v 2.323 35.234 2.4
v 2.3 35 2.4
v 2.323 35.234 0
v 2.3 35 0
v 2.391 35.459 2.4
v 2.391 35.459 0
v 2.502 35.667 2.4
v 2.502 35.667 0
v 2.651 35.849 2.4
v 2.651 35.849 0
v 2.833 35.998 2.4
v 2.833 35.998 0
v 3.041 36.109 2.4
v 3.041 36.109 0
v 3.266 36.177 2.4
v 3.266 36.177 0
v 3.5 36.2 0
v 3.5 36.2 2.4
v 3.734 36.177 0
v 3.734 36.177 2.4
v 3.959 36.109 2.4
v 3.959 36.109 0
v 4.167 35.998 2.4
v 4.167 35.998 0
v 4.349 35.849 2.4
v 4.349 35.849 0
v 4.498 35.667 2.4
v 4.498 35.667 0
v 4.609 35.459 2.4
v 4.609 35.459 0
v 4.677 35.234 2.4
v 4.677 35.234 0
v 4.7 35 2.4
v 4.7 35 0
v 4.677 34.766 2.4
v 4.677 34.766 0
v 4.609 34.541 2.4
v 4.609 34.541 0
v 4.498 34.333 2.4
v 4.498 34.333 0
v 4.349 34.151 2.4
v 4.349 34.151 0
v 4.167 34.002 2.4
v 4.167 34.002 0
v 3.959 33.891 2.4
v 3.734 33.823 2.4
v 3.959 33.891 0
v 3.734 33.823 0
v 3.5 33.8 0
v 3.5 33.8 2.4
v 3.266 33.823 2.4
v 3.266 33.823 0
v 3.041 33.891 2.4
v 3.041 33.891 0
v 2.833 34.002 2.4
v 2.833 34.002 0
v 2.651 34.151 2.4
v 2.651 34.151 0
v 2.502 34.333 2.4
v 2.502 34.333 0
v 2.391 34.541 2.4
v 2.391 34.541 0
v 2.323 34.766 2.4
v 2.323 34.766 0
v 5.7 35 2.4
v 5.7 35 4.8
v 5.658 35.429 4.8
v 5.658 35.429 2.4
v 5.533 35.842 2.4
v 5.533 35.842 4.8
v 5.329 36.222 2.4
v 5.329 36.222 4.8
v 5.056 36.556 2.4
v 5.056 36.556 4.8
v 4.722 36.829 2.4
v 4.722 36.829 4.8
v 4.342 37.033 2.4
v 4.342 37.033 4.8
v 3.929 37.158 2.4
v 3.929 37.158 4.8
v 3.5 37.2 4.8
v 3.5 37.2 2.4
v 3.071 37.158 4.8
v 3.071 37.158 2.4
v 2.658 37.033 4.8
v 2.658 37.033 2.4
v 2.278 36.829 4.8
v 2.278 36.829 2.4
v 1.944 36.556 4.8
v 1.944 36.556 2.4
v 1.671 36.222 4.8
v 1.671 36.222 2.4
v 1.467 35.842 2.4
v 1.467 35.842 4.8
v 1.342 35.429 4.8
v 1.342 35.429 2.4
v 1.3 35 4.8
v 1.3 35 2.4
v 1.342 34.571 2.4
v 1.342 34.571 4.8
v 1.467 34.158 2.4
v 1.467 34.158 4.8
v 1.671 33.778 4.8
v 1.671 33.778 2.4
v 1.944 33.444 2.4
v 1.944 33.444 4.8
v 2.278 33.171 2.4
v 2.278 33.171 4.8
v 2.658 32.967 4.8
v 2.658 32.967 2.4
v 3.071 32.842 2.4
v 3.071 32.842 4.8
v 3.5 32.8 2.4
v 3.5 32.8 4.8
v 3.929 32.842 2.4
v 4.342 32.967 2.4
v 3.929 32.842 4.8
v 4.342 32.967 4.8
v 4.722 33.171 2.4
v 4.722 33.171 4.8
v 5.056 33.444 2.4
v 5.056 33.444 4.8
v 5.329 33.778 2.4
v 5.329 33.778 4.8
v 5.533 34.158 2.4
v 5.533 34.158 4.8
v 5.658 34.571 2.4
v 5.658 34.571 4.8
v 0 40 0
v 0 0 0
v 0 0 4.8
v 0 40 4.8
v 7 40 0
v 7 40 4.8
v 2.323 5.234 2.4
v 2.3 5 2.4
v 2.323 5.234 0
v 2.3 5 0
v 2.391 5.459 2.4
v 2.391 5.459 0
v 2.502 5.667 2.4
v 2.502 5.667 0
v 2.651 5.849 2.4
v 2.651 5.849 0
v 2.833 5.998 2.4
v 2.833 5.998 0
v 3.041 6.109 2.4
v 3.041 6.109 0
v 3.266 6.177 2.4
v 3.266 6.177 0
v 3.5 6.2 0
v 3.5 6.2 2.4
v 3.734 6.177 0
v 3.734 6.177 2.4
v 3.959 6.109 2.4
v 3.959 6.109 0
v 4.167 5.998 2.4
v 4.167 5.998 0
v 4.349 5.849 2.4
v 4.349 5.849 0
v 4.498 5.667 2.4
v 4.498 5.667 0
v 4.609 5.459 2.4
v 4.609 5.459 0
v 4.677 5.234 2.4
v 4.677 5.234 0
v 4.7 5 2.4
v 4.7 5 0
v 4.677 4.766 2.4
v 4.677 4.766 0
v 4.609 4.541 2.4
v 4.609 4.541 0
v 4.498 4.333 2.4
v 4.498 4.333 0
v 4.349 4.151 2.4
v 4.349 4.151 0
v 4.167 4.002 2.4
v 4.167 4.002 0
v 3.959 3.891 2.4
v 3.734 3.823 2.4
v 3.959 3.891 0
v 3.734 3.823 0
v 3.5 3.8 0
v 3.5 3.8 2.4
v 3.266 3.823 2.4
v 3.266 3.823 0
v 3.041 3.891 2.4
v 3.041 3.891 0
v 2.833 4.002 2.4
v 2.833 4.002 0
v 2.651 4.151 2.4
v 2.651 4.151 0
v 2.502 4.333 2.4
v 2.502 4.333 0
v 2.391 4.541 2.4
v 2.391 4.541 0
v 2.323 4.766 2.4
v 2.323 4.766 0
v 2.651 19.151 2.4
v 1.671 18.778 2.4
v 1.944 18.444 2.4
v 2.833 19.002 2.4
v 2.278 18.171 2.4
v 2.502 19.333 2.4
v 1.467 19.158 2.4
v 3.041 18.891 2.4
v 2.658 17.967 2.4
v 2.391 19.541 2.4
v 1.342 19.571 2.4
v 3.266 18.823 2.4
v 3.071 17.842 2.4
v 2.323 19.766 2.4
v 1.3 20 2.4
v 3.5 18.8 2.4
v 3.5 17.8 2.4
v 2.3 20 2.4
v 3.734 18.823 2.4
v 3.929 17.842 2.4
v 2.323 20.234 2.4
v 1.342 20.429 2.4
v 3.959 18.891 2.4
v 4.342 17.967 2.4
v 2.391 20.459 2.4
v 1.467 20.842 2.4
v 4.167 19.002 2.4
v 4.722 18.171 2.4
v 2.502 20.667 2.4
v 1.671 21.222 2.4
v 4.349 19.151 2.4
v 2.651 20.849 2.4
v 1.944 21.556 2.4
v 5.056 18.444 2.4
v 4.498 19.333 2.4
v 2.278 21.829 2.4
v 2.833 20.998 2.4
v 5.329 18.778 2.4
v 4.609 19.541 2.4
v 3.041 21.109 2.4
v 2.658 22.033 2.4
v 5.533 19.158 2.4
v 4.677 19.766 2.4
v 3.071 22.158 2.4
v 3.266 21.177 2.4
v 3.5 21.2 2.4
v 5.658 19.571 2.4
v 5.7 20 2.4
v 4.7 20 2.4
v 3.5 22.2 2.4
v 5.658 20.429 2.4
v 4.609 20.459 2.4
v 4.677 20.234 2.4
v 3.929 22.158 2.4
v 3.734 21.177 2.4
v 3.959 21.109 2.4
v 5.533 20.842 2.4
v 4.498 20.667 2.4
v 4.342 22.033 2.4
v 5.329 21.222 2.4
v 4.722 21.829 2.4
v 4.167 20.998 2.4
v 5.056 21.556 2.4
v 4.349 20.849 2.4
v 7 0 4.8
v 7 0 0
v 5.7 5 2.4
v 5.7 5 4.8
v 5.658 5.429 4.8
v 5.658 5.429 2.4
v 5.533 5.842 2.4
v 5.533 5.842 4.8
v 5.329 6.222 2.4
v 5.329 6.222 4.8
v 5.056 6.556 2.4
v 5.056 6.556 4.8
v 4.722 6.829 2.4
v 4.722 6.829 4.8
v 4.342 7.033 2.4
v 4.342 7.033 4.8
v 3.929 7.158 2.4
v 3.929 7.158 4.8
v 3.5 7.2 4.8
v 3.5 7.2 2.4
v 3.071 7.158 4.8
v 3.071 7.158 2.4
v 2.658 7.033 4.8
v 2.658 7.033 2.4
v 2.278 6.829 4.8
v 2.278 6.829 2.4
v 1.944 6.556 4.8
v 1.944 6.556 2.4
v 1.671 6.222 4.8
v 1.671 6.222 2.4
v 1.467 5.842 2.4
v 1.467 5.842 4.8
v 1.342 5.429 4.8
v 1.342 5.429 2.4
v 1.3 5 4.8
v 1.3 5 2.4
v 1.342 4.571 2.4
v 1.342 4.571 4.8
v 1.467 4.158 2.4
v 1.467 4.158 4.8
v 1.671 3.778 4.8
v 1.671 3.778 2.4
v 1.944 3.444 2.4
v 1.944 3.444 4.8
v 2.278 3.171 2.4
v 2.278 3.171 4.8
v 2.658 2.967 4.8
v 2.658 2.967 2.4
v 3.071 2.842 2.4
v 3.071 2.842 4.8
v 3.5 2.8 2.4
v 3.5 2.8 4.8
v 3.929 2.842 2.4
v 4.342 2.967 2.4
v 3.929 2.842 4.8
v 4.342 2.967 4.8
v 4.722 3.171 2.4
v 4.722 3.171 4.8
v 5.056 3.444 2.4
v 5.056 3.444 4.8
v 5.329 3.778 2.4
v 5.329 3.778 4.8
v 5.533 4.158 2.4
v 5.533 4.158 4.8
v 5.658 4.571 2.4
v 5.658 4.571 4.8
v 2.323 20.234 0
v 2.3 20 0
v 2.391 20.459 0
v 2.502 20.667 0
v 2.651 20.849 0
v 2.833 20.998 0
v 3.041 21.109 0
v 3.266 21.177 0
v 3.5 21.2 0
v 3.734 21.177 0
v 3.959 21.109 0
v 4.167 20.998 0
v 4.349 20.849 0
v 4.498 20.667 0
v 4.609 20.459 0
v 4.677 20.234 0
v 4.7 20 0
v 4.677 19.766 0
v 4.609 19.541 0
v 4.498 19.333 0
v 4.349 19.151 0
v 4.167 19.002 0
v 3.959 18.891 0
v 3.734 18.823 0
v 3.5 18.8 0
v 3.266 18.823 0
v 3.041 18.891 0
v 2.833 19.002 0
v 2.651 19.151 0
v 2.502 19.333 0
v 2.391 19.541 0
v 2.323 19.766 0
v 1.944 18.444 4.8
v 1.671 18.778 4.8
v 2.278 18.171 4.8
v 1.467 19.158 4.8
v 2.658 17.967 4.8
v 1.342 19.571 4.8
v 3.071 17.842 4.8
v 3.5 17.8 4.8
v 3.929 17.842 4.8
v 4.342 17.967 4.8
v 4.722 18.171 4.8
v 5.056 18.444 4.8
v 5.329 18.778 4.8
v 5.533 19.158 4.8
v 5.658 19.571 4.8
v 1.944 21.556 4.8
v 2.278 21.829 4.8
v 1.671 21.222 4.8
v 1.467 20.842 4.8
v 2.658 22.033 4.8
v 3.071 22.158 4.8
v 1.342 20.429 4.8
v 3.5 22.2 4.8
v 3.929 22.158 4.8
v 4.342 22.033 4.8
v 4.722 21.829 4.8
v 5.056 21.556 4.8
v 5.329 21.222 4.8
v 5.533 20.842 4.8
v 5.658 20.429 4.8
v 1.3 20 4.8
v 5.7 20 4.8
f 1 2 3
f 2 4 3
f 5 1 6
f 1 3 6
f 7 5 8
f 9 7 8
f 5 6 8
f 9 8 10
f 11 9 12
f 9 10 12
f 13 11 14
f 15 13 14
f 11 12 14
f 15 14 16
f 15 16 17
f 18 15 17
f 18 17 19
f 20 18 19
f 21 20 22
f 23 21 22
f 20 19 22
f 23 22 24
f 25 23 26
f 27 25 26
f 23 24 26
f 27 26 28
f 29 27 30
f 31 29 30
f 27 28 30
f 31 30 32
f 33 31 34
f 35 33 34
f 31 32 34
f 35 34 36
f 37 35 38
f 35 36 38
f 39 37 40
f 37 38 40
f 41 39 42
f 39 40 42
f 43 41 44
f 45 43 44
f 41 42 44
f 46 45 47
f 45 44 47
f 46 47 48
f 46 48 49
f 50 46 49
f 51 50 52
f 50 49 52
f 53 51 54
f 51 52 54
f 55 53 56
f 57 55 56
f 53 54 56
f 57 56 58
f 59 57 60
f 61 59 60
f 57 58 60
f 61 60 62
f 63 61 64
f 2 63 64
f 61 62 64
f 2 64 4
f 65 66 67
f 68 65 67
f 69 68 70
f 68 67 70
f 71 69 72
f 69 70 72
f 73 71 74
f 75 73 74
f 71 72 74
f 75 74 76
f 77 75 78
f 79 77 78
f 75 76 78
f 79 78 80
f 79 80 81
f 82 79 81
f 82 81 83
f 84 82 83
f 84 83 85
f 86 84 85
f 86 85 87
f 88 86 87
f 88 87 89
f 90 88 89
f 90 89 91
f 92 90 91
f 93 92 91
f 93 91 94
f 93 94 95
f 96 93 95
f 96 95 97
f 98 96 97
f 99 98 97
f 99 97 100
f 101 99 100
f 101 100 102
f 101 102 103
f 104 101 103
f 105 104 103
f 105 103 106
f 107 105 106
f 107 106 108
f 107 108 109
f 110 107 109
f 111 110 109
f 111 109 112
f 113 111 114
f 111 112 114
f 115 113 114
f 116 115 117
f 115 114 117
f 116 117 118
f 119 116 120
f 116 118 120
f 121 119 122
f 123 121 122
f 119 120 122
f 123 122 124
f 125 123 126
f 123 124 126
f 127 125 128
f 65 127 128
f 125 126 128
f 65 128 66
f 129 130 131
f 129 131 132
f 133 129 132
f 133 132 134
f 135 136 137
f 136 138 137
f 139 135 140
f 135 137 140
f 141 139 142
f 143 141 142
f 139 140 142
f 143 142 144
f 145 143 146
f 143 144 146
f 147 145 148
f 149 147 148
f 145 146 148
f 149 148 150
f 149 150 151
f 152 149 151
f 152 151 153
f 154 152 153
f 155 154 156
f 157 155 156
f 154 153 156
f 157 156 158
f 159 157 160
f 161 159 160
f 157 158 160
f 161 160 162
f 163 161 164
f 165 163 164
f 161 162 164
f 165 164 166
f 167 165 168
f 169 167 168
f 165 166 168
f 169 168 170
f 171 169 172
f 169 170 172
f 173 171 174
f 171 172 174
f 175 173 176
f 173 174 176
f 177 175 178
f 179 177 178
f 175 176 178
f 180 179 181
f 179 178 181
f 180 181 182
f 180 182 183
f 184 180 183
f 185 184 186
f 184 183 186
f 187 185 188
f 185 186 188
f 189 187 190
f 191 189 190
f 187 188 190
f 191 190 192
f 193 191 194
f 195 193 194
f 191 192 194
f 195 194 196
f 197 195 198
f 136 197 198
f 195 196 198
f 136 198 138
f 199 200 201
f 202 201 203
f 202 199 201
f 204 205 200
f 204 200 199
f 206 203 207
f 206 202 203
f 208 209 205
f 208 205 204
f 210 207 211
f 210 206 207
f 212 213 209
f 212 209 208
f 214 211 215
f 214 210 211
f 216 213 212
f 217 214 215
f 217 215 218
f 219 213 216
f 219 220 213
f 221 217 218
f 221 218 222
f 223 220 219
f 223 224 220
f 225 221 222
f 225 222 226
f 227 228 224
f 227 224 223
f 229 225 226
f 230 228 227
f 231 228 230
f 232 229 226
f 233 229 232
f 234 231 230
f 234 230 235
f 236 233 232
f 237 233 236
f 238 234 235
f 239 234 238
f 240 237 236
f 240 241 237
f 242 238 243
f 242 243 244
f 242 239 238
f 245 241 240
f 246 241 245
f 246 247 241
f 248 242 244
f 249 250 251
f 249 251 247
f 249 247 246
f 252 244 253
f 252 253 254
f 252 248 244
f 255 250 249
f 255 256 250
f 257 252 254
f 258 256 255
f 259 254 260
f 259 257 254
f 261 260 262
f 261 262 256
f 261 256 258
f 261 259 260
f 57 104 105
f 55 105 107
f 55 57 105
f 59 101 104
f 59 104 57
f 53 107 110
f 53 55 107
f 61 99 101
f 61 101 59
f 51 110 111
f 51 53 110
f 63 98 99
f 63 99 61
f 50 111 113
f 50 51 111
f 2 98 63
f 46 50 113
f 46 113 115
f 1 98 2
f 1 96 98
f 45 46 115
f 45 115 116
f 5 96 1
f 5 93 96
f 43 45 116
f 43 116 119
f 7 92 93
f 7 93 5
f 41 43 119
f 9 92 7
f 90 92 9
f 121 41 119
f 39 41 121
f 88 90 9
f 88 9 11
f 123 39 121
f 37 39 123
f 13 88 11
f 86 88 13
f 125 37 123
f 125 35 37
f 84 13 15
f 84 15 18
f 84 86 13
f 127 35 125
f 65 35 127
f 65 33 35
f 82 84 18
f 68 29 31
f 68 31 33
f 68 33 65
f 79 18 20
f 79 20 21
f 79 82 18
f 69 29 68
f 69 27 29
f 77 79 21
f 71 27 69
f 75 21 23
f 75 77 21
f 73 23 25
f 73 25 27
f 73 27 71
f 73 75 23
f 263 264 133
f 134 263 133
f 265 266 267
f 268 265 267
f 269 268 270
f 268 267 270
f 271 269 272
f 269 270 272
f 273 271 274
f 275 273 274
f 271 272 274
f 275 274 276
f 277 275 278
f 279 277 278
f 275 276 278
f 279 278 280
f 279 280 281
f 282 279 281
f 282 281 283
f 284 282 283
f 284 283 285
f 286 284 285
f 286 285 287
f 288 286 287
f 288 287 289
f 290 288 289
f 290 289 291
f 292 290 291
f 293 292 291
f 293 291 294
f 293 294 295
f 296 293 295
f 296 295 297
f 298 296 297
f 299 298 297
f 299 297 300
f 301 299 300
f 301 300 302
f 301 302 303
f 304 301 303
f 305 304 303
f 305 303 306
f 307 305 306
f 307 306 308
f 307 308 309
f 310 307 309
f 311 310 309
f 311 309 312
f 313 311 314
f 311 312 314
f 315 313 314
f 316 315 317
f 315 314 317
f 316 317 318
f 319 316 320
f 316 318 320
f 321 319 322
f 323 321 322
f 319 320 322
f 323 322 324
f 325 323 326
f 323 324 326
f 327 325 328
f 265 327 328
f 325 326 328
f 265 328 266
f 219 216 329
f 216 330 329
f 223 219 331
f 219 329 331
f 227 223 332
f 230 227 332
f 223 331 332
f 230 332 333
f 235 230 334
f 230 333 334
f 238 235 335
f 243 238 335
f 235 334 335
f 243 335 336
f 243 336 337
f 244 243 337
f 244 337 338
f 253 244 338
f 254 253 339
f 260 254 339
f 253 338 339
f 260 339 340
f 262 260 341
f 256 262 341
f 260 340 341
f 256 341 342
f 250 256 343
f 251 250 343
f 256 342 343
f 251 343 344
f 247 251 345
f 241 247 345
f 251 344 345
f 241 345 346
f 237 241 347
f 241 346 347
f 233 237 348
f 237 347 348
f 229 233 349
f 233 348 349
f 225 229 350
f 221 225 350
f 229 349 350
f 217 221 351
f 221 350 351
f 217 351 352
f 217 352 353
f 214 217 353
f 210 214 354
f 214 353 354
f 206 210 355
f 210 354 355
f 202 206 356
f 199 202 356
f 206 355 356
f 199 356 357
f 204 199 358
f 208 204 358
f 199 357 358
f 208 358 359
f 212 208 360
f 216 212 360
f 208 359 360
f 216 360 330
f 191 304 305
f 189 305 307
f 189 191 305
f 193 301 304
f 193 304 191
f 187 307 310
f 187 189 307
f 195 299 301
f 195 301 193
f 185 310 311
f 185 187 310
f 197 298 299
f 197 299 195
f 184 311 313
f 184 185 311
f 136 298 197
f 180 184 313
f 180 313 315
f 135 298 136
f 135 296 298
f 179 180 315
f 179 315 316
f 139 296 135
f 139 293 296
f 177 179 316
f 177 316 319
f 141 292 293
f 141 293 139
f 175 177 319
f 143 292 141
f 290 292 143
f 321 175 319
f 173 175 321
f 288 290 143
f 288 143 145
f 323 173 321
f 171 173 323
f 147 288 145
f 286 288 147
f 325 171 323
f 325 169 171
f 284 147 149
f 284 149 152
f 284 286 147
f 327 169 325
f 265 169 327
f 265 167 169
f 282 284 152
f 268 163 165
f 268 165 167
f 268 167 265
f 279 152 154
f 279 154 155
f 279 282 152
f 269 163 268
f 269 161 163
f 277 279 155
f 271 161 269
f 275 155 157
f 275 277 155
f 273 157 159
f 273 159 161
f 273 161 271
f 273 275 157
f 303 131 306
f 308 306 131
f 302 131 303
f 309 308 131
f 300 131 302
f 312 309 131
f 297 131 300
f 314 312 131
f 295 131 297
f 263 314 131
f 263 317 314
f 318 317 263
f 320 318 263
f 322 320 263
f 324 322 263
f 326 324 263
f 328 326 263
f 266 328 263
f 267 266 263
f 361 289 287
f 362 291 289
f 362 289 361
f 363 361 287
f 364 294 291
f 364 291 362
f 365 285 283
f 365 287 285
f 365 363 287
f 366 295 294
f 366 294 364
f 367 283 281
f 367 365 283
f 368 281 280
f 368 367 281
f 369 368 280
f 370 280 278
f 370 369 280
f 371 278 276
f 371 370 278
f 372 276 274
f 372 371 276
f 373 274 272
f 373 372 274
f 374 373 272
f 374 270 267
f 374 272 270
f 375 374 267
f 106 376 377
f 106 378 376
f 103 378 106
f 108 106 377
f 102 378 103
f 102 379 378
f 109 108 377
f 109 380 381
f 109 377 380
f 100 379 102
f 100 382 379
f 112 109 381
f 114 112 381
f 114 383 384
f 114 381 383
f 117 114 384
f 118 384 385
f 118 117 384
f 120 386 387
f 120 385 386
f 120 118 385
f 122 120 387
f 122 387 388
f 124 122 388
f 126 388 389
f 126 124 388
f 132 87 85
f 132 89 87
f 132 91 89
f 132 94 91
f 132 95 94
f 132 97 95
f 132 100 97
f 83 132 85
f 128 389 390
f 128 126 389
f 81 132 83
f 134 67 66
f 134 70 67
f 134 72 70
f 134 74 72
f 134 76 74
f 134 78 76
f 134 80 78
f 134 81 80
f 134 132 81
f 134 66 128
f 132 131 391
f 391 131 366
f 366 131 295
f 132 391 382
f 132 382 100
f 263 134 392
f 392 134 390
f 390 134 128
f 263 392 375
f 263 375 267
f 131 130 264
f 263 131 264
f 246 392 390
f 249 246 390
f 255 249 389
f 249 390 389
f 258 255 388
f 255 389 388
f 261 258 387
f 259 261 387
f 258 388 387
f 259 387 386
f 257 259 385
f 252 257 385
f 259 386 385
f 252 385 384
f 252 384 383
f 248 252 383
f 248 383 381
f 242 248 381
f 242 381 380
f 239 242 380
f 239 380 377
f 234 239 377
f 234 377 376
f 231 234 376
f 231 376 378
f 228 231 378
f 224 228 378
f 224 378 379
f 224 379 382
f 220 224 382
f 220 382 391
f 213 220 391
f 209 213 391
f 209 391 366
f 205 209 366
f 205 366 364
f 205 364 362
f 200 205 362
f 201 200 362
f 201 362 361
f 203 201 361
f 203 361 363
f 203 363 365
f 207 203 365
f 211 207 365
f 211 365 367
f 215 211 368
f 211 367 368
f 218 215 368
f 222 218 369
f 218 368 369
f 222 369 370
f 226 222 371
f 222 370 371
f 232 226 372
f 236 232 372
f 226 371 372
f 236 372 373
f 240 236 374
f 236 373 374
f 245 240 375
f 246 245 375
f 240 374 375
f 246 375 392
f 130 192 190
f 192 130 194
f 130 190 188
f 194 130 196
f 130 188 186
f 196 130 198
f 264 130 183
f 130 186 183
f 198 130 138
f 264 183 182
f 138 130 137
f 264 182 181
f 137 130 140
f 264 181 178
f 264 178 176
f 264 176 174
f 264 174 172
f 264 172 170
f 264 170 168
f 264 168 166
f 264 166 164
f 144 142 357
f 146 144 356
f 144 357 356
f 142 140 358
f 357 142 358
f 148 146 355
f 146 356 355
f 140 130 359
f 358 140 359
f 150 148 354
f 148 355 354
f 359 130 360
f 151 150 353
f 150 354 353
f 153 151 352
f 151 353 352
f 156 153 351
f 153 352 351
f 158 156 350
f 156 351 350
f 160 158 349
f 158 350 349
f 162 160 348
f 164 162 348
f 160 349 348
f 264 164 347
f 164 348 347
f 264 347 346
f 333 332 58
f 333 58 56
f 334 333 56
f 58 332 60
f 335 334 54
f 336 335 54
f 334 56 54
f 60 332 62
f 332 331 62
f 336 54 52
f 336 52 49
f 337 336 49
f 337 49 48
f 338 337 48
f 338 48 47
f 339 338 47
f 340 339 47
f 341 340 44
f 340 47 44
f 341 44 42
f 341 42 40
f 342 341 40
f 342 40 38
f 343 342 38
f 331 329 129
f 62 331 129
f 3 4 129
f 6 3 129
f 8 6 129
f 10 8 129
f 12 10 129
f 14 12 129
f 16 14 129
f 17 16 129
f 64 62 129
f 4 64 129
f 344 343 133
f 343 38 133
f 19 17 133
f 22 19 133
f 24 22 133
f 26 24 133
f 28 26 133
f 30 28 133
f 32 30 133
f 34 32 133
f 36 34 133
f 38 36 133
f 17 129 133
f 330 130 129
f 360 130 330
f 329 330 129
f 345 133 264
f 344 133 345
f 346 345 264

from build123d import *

# Parameters (mm, degrees)
SKETCH_1_W                   = 7
SKETCH_1_H                   = 40
EXTRUDE_1_DEPTH              = 4.8
HOLE_WIZARD_M2_1_D           = 2.4
HOLE_WIZARD_M2_1_DEPTH       = 10.1
HOLE_WIZARD_M2_1_CBORE_D     = 4.4
HOLE_WIZARD_M2_1_CBORE_DEPTH = 2.4
HOLE_WIZARD_M2_1_TIP         = 0.721032743


with BuildPart() as part:
    # 草图1 → 凸台-拉伸1 (new body)
    with BuildSketch(Plane.XY):
        with Locations((3.5, 20)):
            Rectangle(SKETCH_1_W, SKETCH_1_H)
    extrude(amount=EXTRUDE_1_DEPTH)

    # M2 六角凹头螺钉的柱形沉头孔1
    with Locations(Plane.XY.offset(4.8)):
        with Locations((3.5, 35), (3.5, 20), (3.5, 5)):
            CounterBoreHole(HOLE_WIZARD_M2_1_D / 2, HOLE_WIZARD_M2_1_CBORE_D / 2, HOLE_WIZARD_M2_1_CBORE_DEPTH, depth=HOLE_WIZARD_M2_1_DEPTH)
            with Locations((0, 0, -(HOLE_WIZARD_M2_1_DEPTH + HOLE_WIZARD_M2_1_TIP / 2))):  # 118° drill point
                Cone(0, HOLE_WIZARD_M2_1_D / 2, HOLE_WIZARD_M2_1_TIP, mode=Mode.SUBTRACT)


solid = part.part
